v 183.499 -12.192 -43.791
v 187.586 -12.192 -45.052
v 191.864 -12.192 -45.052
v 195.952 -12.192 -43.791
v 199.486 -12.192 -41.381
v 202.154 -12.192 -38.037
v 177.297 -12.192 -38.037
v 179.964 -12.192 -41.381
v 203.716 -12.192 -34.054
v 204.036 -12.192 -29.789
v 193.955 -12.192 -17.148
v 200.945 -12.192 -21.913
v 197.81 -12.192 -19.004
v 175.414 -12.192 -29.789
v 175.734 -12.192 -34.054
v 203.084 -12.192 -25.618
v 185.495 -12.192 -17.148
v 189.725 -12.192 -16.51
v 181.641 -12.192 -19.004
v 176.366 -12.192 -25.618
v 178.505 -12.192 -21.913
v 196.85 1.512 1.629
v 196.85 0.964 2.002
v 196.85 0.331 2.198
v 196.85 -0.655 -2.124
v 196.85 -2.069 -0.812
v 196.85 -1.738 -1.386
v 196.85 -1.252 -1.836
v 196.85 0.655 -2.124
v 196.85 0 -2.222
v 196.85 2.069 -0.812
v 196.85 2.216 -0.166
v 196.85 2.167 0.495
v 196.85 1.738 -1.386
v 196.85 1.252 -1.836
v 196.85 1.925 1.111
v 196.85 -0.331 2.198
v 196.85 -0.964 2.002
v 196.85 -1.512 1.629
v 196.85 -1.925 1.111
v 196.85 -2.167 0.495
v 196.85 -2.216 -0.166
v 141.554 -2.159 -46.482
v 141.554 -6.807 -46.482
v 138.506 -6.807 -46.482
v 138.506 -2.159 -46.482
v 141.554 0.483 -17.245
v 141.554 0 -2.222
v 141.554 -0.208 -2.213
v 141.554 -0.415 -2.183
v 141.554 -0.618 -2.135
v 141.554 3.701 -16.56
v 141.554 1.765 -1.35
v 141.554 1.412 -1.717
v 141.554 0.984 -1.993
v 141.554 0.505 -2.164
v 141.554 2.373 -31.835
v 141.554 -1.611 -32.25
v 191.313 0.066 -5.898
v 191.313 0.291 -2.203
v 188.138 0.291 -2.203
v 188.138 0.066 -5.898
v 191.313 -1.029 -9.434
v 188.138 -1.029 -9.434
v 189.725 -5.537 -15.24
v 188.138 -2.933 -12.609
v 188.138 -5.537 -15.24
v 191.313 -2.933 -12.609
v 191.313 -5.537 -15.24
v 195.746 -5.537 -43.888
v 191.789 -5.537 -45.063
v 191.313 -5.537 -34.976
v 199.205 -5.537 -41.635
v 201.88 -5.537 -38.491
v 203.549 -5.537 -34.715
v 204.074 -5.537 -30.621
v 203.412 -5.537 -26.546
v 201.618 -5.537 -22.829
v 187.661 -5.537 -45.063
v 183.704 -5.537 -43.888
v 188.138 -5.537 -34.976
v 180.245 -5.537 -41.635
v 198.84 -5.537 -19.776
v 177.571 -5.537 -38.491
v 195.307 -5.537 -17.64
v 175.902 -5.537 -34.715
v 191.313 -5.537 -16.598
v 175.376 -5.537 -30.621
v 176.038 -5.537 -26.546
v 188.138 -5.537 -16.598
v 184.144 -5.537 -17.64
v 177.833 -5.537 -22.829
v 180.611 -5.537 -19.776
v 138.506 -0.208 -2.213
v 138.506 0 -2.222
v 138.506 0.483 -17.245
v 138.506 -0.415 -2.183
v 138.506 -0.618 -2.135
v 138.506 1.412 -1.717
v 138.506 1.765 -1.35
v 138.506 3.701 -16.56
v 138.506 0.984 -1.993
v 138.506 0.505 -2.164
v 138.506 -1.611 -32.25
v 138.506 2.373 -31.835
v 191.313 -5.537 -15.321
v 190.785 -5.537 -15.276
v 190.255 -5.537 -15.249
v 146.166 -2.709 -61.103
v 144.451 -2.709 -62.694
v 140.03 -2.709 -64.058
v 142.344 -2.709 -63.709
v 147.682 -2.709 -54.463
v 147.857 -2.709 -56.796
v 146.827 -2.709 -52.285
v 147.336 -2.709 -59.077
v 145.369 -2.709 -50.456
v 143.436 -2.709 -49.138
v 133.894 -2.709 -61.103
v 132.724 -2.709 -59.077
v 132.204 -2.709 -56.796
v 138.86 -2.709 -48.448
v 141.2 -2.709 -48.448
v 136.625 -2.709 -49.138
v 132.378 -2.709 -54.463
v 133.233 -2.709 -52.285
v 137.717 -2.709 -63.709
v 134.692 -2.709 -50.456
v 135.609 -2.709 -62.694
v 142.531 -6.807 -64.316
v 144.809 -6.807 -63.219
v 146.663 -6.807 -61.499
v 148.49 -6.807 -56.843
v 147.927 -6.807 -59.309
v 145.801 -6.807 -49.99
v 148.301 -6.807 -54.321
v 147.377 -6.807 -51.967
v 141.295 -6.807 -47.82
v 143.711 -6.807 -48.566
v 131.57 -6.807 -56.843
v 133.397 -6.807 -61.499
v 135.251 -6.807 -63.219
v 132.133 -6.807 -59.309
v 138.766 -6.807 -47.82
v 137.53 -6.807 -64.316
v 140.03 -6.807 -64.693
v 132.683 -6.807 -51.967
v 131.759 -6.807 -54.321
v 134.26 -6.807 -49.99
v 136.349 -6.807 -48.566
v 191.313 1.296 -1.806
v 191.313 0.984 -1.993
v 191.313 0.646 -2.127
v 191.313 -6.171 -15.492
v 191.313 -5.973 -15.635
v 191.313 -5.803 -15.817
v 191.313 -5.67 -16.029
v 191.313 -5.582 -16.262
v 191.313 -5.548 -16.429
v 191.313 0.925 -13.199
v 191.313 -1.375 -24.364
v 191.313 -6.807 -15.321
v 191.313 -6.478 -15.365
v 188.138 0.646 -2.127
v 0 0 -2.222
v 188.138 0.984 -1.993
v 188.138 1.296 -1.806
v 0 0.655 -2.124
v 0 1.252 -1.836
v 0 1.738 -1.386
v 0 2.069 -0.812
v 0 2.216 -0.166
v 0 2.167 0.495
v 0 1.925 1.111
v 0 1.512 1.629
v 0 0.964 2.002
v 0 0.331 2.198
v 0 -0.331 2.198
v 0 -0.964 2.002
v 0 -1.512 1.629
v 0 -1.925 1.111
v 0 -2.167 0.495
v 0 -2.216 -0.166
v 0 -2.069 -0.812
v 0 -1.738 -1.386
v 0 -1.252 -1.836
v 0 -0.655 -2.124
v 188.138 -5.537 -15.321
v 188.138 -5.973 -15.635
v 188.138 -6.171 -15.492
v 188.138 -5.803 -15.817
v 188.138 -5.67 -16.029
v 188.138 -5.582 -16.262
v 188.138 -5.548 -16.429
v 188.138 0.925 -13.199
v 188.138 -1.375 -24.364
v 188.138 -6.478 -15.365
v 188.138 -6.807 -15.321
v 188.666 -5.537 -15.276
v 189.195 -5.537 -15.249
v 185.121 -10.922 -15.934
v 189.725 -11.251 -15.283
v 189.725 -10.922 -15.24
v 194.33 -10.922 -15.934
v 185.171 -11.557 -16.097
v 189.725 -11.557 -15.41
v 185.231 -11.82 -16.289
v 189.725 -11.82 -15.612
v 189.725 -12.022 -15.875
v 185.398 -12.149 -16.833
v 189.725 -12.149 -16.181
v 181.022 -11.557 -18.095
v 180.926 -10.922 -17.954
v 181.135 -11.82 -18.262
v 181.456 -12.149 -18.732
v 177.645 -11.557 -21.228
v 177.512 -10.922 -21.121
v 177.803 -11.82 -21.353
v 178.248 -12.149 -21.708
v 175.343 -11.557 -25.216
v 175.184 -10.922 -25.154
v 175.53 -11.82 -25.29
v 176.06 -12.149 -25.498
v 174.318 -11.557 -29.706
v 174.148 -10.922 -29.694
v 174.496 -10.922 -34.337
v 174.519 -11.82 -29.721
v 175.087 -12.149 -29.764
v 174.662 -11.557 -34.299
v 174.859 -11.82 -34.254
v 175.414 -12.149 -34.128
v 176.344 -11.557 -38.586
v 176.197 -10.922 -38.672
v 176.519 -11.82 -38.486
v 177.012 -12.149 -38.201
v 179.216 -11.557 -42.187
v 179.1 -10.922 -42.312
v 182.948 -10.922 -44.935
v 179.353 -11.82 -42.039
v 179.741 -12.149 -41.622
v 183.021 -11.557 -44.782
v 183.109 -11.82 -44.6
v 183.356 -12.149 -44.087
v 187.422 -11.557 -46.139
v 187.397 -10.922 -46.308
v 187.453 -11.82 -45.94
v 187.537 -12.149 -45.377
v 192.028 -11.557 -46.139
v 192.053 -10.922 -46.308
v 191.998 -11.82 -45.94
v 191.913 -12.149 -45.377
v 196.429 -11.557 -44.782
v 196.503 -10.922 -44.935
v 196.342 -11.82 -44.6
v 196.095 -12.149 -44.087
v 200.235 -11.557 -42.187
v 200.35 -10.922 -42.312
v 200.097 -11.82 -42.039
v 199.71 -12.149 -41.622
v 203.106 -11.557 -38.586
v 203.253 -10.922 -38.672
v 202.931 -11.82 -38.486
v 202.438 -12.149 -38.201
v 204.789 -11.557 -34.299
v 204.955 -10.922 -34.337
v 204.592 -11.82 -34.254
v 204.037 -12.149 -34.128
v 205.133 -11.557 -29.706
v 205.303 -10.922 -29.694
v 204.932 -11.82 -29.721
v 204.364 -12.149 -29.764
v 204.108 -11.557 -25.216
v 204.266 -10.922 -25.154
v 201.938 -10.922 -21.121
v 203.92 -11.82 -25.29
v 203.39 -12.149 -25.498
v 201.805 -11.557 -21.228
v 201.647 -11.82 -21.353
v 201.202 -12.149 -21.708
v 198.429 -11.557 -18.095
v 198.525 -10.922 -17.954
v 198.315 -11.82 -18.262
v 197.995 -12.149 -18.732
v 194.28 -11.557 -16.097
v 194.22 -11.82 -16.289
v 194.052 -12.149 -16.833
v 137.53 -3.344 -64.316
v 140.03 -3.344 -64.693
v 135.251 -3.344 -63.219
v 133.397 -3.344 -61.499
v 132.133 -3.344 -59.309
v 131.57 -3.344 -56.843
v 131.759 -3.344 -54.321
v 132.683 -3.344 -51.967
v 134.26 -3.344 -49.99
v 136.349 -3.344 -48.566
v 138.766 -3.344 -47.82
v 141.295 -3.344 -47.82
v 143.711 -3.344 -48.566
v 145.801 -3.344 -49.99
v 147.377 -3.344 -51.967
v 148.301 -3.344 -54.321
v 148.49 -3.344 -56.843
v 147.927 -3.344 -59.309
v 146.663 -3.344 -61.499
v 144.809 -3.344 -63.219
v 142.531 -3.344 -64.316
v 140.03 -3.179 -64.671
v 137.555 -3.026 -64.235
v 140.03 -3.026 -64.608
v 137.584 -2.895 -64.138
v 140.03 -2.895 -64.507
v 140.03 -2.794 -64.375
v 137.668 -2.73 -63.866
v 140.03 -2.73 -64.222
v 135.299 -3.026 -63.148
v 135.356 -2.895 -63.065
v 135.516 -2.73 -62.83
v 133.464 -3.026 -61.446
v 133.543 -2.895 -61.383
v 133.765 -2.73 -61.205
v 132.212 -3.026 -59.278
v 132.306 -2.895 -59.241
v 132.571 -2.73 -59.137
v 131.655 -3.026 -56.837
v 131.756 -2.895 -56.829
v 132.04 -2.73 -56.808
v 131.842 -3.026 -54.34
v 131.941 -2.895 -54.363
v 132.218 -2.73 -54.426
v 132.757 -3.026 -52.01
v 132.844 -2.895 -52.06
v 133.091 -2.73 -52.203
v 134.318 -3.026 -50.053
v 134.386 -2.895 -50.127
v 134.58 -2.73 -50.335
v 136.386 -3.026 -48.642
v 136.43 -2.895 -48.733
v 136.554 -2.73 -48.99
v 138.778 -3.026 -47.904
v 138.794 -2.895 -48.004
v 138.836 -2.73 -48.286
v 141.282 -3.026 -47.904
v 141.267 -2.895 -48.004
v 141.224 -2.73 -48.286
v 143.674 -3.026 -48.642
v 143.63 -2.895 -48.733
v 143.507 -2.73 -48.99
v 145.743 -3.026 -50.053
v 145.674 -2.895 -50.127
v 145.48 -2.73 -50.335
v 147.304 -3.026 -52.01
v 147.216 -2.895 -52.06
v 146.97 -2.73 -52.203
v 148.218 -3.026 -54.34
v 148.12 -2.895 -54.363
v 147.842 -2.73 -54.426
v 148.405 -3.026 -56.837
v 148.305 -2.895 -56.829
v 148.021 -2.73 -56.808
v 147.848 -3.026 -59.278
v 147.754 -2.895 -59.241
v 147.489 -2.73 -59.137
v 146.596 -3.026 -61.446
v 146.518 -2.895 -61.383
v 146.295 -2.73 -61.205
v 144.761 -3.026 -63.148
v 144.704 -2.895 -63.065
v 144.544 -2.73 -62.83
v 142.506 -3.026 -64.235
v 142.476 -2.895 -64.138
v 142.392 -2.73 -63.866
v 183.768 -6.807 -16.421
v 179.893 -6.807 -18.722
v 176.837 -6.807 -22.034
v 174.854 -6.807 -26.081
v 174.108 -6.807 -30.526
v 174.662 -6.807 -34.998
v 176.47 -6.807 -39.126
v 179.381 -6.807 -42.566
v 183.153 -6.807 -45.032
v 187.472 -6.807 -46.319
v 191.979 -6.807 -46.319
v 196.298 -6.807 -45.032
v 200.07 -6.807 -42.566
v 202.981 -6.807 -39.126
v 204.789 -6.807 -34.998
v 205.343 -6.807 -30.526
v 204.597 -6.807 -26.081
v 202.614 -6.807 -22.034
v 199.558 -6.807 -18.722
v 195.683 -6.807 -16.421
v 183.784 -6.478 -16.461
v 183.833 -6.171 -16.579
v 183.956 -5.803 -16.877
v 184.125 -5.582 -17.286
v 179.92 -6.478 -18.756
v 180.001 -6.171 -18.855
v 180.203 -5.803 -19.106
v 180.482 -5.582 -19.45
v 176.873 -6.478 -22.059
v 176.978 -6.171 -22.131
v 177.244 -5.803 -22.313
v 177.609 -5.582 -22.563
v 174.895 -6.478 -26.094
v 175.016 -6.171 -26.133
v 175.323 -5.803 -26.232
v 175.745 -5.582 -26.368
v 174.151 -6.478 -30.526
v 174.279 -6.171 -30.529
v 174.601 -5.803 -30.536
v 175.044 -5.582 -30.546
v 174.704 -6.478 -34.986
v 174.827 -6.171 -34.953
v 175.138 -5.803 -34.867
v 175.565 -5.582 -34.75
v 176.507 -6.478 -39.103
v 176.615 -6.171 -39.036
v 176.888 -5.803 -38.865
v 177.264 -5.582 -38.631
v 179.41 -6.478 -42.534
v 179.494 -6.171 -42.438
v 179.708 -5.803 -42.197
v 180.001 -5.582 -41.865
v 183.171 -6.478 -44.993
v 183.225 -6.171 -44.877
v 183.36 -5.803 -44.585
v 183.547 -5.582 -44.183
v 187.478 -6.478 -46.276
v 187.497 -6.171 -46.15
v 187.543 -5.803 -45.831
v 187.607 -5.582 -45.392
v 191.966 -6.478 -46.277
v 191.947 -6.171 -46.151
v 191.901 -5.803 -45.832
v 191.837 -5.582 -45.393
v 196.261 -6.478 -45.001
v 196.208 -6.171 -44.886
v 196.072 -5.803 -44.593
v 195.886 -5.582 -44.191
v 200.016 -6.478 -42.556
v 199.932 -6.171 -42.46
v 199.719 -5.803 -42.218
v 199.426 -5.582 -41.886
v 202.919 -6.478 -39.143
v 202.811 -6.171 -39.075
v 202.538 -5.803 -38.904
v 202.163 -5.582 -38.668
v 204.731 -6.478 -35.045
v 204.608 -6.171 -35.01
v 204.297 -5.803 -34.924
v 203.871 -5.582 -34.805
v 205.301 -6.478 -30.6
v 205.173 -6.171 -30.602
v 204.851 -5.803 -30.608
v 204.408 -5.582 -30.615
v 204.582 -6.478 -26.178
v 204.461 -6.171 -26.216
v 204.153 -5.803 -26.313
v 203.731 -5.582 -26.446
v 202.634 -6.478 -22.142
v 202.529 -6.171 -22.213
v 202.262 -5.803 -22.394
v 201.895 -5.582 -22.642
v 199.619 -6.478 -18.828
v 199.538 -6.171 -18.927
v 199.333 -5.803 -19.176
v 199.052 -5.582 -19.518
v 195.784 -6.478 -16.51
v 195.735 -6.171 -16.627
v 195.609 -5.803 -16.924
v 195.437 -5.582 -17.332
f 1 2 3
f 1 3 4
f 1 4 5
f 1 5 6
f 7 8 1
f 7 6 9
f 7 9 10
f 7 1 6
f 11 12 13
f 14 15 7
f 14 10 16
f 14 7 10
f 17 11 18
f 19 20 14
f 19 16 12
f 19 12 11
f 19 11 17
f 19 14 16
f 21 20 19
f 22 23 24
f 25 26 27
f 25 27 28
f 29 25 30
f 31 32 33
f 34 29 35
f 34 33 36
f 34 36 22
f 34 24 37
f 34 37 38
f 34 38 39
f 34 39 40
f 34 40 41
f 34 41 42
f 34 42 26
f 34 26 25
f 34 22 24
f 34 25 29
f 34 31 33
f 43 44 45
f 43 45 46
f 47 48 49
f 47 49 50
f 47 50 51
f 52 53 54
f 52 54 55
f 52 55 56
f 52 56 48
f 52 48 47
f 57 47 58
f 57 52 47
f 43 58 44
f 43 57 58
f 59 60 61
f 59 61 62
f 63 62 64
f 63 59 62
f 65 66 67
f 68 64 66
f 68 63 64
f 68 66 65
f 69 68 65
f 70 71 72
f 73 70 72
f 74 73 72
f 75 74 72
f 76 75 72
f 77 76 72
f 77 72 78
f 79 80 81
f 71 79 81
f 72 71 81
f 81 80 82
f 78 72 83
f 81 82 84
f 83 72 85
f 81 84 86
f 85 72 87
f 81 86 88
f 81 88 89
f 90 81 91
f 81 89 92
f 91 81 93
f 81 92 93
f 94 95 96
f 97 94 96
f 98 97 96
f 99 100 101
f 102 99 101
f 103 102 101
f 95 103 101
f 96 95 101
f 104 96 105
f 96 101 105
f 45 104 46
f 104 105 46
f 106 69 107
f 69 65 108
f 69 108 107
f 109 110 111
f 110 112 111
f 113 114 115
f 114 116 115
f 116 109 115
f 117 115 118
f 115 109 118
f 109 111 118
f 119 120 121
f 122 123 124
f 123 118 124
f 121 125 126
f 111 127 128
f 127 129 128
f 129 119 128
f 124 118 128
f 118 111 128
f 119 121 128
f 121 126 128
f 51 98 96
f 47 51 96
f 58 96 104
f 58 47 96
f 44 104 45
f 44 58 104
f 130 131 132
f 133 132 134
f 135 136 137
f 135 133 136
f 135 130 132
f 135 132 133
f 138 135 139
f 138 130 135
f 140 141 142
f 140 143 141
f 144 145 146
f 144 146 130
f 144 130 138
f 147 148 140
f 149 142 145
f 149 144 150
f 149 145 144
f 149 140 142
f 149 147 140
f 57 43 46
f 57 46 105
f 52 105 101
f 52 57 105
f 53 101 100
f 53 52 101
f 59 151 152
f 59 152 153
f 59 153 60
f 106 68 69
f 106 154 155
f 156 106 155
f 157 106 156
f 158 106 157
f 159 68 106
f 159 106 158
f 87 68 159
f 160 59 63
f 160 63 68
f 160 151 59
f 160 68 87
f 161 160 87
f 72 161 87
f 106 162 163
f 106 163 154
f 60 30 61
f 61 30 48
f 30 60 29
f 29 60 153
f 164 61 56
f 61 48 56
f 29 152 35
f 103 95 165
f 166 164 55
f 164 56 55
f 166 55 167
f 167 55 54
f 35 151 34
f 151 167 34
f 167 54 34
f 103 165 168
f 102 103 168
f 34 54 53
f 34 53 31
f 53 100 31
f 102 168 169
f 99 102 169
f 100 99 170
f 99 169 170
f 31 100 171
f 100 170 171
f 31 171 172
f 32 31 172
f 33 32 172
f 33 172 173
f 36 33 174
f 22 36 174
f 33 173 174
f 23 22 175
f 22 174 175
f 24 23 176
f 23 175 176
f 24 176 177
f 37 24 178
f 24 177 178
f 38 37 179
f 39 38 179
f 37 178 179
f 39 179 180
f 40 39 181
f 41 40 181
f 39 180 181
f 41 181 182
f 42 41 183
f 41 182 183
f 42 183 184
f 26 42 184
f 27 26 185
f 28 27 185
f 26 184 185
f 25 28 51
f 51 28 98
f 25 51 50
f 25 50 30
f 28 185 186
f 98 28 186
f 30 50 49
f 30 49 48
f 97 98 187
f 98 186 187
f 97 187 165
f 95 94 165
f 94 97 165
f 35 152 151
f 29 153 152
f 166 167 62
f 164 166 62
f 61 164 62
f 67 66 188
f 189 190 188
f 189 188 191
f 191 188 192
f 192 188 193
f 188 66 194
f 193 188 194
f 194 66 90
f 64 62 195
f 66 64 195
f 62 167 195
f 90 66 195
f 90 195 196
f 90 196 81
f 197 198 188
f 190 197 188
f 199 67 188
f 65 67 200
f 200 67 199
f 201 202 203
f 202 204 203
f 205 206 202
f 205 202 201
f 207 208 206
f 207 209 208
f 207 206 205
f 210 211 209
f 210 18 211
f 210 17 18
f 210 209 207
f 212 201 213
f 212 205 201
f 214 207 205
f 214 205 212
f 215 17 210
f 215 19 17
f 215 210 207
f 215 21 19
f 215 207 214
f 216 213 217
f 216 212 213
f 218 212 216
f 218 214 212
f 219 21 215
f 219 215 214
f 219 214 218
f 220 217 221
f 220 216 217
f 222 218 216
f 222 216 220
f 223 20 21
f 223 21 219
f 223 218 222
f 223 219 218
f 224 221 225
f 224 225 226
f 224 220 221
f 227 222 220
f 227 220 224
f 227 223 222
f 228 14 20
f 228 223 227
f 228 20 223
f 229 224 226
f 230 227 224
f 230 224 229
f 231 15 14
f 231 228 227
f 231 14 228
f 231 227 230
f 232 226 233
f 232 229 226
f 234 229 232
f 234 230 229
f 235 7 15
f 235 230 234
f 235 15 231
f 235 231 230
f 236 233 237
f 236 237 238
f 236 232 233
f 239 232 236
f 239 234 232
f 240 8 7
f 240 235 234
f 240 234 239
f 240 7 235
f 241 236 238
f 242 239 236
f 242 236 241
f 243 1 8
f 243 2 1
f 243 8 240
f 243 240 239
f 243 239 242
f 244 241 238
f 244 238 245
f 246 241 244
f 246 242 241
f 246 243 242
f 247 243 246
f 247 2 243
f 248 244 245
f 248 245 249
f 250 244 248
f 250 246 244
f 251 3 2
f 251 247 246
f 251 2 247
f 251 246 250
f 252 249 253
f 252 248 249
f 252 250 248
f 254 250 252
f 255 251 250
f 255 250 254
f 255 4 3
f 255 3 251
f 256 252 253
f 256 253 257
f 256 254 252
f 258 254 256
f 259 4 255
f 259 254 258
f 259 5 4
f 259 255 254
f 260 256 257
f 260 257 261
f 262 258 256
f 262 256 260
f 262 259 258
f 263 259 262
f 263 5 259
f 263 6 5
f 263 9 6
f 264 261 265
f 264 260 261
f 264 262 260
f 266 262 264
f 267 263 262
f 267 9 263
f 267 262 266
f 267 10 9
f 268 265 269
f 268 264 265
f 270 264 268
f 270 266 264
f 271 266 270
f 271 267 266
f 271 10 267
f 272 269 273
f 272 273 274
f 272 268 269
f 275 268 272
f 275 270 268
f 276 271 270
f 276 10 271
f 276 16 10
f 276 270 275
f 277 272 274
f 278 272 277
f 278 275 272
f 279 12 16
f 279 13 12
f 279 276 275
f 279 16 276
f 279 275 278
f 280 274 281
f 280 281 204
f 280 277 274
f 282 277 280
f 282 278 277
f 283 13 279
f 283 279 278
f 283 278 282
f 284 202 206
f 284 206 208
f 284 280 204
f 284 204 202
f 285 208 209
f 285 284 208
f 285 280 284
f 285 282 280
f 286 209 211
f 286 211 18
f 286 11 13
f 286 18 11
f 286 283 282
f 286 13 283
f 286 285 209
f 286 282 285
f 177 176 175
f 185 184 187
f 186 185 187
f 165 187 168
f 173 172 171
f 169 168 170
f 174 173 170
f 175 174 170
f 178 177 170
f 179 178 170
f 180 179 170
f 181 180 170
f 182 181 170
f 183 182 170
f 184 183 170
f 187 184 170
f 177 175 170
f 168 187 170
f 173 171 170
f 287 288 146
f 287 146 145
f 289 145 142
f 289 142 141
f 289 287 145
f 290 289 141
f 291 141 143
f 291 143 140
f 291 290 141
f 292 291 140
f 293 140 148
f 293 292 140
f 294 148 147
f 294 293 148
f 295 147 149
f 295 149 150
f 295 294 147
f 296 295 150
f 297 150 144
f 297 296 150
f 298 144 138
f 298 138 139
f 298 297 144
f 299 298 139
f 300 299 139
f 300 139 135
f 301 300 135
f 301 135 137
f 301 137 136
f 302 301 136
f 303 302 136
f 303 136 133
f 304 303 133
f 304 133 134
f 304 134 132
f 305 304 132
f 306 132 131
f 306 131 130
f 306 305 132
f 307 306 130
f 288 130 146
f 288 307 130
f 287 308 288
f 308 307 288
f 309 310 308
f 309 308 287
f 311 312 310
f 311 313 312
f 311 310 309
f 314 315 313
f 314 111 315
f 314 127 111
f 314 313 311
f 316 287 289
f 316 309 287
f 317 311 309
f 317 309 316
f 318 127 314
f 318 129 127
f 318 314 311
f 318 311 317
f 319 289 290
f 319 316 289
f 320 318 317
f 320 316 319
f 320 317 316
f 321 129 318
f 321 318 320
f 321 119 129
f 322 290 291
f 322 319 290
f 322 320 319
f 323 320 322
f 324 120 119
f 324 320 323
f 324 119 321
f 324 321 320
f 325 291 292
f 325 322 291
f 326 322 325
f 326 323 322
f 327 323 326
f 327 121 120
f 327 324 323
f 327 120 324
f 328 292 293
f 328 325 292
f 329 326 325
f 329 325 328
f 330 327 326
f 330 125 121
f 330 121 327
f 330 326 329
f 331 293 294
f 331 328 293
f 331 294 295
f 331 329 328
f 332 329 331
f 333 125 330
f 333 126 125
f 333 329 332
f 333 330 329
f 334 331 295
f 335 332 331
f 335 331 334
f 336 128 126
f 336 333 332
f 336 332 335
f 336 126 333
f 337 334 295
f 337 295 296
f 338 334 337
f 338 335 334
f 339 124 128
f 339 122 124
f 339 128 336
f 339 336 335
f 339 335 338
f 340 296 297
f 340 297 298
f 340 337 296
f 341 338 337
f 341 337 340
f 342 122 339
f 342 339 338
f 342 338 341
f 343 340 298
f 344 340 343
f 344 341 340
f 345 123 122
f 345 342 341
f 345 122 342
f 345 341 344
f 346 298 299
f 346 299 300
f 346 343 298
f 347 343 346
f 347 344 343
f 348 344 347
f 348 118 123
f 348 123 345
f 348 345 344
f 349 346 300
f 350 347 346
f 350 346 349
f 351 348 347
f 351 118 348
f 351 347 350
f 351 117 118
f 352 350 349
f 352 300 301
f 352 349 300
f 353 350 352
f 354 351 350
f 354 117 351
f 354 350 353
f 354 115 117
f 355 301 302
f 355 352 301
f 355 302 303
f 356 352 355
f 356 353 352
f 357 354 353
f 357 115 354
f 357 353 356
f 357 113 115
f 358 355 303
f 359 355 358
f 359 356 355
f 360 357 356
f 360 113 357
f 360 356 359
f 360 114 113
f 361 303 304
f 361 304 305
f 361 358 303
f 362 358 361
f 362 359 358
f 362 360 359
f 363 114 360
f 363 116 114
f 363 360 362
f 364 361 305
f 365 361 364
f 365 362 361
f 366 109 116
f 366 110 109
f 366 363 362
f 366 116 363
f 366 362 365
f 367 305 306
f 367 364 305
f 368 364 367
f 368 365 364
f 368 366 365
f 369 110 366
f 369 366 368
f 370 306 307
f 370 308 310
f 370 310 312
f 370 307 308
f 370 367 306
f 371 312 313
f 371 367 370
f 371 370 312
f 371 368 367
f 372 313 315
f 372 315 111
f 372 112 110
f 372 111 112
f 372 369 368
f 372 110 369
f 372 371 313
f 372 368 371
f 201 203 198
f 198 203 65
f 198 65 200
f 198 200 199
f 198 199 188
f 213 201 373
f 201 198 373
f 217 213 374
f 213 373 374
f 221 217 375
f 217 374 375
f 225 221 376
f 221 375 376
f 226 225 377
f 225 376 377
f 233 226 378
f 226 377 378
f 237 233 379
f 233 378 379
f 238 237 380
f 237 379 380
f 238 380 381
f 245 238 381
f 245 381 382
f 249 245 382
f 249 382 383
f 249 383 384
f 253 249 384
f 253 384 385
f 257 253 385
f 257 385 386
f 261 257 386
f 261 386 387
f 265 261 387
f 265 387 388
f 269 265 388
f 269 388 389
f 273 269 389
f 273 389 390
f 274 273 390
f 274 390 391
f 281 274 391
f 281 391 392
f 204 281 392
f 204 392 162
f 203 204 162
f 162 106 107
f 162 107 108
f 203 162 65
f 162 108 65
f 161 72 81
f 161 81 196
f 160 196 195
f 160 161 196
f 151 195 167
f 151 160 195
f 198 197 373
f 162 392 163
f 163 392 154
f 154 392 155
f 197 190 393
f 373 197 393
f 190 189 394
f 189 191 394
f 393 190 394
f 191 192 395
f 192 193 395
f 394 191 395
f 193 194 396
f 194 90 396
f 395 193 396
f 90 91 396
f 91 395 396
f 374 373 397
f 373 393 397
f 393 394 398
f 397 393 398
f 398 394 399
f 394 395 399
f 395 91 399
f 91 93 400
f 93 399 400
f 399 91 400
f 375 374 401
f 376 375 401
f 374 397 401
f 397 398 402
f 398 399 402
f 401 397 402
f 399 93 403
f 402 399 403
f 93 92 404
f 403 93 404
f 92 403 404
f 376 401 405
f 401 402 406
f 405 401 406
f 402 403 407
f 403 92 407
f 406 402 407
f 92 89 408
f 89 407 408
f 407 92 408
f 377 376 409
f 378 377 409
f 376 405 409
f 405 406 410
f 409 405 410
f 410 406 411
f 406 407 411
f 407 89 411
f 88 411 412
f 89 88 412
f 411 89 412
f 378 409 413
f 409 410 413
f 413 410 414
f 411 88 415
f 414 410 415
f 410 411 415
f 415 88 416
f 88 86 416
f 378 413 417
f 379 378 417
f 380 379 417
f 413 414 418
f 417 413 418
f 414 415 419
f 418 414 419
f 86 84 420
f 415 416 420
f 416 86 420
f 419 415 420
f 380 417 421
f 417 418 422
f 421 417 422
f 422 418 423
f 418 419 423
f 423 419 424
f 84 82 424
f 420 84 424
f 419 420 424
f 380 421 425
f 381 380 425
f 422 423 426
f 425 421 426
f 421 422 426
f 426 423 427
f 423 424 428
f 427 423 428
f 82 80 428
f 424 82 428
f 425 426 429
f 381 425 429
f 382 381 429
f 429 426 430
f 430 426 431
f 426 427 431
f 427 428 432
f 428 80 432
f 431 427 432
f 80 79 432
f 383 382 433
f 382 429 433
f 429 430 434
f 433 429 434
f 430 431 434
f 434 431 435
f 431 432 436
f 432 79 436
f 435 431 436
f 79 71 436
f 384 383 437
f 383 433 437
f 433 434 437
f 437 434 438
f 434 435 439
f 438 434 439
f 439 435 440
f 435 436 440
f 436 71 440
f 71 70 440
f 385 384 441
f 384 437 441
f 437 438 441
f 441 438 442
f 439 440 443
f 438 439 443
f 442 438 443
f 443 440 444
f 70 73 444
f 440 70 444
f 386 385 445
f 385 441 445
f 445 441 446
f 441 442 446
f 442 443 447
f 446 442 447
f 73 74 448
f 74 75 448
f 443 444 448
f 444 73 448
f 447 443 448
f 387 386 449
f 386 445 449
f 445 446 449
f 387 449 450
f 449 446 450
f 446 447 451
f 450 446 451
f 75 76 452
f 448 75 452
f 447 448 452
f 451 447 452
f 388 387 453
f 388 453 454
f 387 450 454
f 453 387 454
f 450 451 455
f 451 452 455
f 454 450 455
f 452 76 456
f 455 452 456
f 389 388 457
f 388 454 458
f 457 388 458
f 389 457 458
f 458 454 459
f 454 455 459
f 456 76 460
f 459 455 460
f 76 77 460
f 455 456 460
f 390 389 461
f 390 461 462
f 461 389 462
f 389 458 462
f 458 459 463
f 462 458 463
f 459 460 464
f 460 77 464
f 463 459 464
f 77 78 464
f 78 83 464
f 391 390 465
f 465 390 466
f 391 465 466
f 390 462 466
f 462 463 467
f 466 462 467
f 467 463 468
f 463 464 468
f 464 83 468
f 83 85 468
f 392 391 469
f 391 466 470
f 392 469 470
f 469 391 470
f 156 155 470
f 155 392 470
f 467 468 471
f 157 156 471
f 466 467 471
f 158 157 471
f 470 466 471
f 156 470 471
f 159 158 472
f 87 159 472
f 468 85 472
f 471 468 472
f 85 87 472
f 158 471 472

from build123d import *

# Parameters (mm, degrees)
SKETCH1_R           = 2.2225
BOSS_EXTRUDE1_DEPTH = 196.85
BOSS_EXTRUDE2_DEPTH = 3.175
SKETCH3_R           = 15.621
BOSS_EXTRUDE3_DEPTH = 6.6548
FILLET1_R           = 1.27
BOSS_EXTRUDE4_DEPTH = 3.048
SKETCH7_W           = 8.4836
SKETCH7_H           = 4.098529722
FILLET3_R           = 0.635


with BuildPart() as part:
    # Sketch1 → Boss-Extrude1 (new body)
    with BuildSketch(Plane(origin=(0, 0, 0), x_dir=(0, 0, -1), z_dir=(1, 0, 0))):
        Circle(SKETCH1_R)
    extrude(amount=BOSS_EXTRUDE1_DEPTH)

    # Sketch2 → Boss-Extrude2 (add)
    with BuildSketch(Plane(origin=(191.3128, 0, 0), x_dir=(0, 0, -1), z_dir=(1, 0, 0))):
        with BuildLine():
            Line((15.24, -5.5372), (34.9758, -5.5372))
            ThreePointArc((34.9758, -5.5372), (17.942872857, 0.189759615), (0, 1.175653677))
            Line((0, 1.175653677), (0, 0))
            ThreePointArc((0, 0), (8.40347241, -0.612253918), (15.24, -5.5372))
        make_face()
    extrude(amount=-BOSS_EXTRUDE2_DEPTH)

    # Sketch3 → Boss-Extrude3 (add)
    with BuildSketch(Plane.XZ.offset(5.5372)):
        with Locations(Location((189.7253, -30.861, 0), (0, 0, 90))):
            Circle(SKETCH3_R)
    extrude(amount=BOSS_EXTRUDE3_DEPTH)

    # Fillet1
    fillet1_edges = [part.edges().sort_by_distance(p)[0] for p in [
        (189.7253, -5.5372, -46.482),
        (189.7253, -12.192, -46.482),
    ]]
    fillet(fillet1_edges, radius=FILLET1_R)

    # Sketch6 → Boss-Extrude4 (add)
    with BuildSketch(Plane.ZY.offset(-141.5542)):
        with BuildLine():
            Line((-46.482, -6.8072), (-46.482, -2.159))
            ThreePointArc((-46.482, -2.159), (-23.539538891, 3.501677184), (0, 1.430470604))
            Line((0, 1.430470604), (0, -1.036494262))
            ThreePointArc((0, -1.036494262), (-23.724853498, -0.024493963), (-46.482, -6.8072))
        make_face()
    extrude(amount=BOSS_EXTRUDE4_DEPTH)


with BuildPart() as body_2:
    # Sketch7 → Revolve1 (revolve)
    with BuildSketch(Plane.ZY.offset(-140.0302), mode=Mode.PRIVATE) as revolve1_sk:
        with Locations((-51.967415937, -4.757935139)):
            Rectangle(SKETCH7_W, SKETCH7_H)
    revolve(revolve1_sk.sketch.rotate(Axis((140.0302, -6.8072, -56.209215937), (0, 1, 0)), 180), axis=Axis((140.0302, -6.8072, -56.209215937), (0, 1, 0)))

    # Fillet3
    fillet3_edges = [body_2.edges().sort_by_distance(p)[0] for p in [
        (140.0302, -2.708670278, -47.725615937),
    ]]
    fillet(fillet3_edges, radius=FILLET3_R)


solid = Compound([part.part, body_2.part])
